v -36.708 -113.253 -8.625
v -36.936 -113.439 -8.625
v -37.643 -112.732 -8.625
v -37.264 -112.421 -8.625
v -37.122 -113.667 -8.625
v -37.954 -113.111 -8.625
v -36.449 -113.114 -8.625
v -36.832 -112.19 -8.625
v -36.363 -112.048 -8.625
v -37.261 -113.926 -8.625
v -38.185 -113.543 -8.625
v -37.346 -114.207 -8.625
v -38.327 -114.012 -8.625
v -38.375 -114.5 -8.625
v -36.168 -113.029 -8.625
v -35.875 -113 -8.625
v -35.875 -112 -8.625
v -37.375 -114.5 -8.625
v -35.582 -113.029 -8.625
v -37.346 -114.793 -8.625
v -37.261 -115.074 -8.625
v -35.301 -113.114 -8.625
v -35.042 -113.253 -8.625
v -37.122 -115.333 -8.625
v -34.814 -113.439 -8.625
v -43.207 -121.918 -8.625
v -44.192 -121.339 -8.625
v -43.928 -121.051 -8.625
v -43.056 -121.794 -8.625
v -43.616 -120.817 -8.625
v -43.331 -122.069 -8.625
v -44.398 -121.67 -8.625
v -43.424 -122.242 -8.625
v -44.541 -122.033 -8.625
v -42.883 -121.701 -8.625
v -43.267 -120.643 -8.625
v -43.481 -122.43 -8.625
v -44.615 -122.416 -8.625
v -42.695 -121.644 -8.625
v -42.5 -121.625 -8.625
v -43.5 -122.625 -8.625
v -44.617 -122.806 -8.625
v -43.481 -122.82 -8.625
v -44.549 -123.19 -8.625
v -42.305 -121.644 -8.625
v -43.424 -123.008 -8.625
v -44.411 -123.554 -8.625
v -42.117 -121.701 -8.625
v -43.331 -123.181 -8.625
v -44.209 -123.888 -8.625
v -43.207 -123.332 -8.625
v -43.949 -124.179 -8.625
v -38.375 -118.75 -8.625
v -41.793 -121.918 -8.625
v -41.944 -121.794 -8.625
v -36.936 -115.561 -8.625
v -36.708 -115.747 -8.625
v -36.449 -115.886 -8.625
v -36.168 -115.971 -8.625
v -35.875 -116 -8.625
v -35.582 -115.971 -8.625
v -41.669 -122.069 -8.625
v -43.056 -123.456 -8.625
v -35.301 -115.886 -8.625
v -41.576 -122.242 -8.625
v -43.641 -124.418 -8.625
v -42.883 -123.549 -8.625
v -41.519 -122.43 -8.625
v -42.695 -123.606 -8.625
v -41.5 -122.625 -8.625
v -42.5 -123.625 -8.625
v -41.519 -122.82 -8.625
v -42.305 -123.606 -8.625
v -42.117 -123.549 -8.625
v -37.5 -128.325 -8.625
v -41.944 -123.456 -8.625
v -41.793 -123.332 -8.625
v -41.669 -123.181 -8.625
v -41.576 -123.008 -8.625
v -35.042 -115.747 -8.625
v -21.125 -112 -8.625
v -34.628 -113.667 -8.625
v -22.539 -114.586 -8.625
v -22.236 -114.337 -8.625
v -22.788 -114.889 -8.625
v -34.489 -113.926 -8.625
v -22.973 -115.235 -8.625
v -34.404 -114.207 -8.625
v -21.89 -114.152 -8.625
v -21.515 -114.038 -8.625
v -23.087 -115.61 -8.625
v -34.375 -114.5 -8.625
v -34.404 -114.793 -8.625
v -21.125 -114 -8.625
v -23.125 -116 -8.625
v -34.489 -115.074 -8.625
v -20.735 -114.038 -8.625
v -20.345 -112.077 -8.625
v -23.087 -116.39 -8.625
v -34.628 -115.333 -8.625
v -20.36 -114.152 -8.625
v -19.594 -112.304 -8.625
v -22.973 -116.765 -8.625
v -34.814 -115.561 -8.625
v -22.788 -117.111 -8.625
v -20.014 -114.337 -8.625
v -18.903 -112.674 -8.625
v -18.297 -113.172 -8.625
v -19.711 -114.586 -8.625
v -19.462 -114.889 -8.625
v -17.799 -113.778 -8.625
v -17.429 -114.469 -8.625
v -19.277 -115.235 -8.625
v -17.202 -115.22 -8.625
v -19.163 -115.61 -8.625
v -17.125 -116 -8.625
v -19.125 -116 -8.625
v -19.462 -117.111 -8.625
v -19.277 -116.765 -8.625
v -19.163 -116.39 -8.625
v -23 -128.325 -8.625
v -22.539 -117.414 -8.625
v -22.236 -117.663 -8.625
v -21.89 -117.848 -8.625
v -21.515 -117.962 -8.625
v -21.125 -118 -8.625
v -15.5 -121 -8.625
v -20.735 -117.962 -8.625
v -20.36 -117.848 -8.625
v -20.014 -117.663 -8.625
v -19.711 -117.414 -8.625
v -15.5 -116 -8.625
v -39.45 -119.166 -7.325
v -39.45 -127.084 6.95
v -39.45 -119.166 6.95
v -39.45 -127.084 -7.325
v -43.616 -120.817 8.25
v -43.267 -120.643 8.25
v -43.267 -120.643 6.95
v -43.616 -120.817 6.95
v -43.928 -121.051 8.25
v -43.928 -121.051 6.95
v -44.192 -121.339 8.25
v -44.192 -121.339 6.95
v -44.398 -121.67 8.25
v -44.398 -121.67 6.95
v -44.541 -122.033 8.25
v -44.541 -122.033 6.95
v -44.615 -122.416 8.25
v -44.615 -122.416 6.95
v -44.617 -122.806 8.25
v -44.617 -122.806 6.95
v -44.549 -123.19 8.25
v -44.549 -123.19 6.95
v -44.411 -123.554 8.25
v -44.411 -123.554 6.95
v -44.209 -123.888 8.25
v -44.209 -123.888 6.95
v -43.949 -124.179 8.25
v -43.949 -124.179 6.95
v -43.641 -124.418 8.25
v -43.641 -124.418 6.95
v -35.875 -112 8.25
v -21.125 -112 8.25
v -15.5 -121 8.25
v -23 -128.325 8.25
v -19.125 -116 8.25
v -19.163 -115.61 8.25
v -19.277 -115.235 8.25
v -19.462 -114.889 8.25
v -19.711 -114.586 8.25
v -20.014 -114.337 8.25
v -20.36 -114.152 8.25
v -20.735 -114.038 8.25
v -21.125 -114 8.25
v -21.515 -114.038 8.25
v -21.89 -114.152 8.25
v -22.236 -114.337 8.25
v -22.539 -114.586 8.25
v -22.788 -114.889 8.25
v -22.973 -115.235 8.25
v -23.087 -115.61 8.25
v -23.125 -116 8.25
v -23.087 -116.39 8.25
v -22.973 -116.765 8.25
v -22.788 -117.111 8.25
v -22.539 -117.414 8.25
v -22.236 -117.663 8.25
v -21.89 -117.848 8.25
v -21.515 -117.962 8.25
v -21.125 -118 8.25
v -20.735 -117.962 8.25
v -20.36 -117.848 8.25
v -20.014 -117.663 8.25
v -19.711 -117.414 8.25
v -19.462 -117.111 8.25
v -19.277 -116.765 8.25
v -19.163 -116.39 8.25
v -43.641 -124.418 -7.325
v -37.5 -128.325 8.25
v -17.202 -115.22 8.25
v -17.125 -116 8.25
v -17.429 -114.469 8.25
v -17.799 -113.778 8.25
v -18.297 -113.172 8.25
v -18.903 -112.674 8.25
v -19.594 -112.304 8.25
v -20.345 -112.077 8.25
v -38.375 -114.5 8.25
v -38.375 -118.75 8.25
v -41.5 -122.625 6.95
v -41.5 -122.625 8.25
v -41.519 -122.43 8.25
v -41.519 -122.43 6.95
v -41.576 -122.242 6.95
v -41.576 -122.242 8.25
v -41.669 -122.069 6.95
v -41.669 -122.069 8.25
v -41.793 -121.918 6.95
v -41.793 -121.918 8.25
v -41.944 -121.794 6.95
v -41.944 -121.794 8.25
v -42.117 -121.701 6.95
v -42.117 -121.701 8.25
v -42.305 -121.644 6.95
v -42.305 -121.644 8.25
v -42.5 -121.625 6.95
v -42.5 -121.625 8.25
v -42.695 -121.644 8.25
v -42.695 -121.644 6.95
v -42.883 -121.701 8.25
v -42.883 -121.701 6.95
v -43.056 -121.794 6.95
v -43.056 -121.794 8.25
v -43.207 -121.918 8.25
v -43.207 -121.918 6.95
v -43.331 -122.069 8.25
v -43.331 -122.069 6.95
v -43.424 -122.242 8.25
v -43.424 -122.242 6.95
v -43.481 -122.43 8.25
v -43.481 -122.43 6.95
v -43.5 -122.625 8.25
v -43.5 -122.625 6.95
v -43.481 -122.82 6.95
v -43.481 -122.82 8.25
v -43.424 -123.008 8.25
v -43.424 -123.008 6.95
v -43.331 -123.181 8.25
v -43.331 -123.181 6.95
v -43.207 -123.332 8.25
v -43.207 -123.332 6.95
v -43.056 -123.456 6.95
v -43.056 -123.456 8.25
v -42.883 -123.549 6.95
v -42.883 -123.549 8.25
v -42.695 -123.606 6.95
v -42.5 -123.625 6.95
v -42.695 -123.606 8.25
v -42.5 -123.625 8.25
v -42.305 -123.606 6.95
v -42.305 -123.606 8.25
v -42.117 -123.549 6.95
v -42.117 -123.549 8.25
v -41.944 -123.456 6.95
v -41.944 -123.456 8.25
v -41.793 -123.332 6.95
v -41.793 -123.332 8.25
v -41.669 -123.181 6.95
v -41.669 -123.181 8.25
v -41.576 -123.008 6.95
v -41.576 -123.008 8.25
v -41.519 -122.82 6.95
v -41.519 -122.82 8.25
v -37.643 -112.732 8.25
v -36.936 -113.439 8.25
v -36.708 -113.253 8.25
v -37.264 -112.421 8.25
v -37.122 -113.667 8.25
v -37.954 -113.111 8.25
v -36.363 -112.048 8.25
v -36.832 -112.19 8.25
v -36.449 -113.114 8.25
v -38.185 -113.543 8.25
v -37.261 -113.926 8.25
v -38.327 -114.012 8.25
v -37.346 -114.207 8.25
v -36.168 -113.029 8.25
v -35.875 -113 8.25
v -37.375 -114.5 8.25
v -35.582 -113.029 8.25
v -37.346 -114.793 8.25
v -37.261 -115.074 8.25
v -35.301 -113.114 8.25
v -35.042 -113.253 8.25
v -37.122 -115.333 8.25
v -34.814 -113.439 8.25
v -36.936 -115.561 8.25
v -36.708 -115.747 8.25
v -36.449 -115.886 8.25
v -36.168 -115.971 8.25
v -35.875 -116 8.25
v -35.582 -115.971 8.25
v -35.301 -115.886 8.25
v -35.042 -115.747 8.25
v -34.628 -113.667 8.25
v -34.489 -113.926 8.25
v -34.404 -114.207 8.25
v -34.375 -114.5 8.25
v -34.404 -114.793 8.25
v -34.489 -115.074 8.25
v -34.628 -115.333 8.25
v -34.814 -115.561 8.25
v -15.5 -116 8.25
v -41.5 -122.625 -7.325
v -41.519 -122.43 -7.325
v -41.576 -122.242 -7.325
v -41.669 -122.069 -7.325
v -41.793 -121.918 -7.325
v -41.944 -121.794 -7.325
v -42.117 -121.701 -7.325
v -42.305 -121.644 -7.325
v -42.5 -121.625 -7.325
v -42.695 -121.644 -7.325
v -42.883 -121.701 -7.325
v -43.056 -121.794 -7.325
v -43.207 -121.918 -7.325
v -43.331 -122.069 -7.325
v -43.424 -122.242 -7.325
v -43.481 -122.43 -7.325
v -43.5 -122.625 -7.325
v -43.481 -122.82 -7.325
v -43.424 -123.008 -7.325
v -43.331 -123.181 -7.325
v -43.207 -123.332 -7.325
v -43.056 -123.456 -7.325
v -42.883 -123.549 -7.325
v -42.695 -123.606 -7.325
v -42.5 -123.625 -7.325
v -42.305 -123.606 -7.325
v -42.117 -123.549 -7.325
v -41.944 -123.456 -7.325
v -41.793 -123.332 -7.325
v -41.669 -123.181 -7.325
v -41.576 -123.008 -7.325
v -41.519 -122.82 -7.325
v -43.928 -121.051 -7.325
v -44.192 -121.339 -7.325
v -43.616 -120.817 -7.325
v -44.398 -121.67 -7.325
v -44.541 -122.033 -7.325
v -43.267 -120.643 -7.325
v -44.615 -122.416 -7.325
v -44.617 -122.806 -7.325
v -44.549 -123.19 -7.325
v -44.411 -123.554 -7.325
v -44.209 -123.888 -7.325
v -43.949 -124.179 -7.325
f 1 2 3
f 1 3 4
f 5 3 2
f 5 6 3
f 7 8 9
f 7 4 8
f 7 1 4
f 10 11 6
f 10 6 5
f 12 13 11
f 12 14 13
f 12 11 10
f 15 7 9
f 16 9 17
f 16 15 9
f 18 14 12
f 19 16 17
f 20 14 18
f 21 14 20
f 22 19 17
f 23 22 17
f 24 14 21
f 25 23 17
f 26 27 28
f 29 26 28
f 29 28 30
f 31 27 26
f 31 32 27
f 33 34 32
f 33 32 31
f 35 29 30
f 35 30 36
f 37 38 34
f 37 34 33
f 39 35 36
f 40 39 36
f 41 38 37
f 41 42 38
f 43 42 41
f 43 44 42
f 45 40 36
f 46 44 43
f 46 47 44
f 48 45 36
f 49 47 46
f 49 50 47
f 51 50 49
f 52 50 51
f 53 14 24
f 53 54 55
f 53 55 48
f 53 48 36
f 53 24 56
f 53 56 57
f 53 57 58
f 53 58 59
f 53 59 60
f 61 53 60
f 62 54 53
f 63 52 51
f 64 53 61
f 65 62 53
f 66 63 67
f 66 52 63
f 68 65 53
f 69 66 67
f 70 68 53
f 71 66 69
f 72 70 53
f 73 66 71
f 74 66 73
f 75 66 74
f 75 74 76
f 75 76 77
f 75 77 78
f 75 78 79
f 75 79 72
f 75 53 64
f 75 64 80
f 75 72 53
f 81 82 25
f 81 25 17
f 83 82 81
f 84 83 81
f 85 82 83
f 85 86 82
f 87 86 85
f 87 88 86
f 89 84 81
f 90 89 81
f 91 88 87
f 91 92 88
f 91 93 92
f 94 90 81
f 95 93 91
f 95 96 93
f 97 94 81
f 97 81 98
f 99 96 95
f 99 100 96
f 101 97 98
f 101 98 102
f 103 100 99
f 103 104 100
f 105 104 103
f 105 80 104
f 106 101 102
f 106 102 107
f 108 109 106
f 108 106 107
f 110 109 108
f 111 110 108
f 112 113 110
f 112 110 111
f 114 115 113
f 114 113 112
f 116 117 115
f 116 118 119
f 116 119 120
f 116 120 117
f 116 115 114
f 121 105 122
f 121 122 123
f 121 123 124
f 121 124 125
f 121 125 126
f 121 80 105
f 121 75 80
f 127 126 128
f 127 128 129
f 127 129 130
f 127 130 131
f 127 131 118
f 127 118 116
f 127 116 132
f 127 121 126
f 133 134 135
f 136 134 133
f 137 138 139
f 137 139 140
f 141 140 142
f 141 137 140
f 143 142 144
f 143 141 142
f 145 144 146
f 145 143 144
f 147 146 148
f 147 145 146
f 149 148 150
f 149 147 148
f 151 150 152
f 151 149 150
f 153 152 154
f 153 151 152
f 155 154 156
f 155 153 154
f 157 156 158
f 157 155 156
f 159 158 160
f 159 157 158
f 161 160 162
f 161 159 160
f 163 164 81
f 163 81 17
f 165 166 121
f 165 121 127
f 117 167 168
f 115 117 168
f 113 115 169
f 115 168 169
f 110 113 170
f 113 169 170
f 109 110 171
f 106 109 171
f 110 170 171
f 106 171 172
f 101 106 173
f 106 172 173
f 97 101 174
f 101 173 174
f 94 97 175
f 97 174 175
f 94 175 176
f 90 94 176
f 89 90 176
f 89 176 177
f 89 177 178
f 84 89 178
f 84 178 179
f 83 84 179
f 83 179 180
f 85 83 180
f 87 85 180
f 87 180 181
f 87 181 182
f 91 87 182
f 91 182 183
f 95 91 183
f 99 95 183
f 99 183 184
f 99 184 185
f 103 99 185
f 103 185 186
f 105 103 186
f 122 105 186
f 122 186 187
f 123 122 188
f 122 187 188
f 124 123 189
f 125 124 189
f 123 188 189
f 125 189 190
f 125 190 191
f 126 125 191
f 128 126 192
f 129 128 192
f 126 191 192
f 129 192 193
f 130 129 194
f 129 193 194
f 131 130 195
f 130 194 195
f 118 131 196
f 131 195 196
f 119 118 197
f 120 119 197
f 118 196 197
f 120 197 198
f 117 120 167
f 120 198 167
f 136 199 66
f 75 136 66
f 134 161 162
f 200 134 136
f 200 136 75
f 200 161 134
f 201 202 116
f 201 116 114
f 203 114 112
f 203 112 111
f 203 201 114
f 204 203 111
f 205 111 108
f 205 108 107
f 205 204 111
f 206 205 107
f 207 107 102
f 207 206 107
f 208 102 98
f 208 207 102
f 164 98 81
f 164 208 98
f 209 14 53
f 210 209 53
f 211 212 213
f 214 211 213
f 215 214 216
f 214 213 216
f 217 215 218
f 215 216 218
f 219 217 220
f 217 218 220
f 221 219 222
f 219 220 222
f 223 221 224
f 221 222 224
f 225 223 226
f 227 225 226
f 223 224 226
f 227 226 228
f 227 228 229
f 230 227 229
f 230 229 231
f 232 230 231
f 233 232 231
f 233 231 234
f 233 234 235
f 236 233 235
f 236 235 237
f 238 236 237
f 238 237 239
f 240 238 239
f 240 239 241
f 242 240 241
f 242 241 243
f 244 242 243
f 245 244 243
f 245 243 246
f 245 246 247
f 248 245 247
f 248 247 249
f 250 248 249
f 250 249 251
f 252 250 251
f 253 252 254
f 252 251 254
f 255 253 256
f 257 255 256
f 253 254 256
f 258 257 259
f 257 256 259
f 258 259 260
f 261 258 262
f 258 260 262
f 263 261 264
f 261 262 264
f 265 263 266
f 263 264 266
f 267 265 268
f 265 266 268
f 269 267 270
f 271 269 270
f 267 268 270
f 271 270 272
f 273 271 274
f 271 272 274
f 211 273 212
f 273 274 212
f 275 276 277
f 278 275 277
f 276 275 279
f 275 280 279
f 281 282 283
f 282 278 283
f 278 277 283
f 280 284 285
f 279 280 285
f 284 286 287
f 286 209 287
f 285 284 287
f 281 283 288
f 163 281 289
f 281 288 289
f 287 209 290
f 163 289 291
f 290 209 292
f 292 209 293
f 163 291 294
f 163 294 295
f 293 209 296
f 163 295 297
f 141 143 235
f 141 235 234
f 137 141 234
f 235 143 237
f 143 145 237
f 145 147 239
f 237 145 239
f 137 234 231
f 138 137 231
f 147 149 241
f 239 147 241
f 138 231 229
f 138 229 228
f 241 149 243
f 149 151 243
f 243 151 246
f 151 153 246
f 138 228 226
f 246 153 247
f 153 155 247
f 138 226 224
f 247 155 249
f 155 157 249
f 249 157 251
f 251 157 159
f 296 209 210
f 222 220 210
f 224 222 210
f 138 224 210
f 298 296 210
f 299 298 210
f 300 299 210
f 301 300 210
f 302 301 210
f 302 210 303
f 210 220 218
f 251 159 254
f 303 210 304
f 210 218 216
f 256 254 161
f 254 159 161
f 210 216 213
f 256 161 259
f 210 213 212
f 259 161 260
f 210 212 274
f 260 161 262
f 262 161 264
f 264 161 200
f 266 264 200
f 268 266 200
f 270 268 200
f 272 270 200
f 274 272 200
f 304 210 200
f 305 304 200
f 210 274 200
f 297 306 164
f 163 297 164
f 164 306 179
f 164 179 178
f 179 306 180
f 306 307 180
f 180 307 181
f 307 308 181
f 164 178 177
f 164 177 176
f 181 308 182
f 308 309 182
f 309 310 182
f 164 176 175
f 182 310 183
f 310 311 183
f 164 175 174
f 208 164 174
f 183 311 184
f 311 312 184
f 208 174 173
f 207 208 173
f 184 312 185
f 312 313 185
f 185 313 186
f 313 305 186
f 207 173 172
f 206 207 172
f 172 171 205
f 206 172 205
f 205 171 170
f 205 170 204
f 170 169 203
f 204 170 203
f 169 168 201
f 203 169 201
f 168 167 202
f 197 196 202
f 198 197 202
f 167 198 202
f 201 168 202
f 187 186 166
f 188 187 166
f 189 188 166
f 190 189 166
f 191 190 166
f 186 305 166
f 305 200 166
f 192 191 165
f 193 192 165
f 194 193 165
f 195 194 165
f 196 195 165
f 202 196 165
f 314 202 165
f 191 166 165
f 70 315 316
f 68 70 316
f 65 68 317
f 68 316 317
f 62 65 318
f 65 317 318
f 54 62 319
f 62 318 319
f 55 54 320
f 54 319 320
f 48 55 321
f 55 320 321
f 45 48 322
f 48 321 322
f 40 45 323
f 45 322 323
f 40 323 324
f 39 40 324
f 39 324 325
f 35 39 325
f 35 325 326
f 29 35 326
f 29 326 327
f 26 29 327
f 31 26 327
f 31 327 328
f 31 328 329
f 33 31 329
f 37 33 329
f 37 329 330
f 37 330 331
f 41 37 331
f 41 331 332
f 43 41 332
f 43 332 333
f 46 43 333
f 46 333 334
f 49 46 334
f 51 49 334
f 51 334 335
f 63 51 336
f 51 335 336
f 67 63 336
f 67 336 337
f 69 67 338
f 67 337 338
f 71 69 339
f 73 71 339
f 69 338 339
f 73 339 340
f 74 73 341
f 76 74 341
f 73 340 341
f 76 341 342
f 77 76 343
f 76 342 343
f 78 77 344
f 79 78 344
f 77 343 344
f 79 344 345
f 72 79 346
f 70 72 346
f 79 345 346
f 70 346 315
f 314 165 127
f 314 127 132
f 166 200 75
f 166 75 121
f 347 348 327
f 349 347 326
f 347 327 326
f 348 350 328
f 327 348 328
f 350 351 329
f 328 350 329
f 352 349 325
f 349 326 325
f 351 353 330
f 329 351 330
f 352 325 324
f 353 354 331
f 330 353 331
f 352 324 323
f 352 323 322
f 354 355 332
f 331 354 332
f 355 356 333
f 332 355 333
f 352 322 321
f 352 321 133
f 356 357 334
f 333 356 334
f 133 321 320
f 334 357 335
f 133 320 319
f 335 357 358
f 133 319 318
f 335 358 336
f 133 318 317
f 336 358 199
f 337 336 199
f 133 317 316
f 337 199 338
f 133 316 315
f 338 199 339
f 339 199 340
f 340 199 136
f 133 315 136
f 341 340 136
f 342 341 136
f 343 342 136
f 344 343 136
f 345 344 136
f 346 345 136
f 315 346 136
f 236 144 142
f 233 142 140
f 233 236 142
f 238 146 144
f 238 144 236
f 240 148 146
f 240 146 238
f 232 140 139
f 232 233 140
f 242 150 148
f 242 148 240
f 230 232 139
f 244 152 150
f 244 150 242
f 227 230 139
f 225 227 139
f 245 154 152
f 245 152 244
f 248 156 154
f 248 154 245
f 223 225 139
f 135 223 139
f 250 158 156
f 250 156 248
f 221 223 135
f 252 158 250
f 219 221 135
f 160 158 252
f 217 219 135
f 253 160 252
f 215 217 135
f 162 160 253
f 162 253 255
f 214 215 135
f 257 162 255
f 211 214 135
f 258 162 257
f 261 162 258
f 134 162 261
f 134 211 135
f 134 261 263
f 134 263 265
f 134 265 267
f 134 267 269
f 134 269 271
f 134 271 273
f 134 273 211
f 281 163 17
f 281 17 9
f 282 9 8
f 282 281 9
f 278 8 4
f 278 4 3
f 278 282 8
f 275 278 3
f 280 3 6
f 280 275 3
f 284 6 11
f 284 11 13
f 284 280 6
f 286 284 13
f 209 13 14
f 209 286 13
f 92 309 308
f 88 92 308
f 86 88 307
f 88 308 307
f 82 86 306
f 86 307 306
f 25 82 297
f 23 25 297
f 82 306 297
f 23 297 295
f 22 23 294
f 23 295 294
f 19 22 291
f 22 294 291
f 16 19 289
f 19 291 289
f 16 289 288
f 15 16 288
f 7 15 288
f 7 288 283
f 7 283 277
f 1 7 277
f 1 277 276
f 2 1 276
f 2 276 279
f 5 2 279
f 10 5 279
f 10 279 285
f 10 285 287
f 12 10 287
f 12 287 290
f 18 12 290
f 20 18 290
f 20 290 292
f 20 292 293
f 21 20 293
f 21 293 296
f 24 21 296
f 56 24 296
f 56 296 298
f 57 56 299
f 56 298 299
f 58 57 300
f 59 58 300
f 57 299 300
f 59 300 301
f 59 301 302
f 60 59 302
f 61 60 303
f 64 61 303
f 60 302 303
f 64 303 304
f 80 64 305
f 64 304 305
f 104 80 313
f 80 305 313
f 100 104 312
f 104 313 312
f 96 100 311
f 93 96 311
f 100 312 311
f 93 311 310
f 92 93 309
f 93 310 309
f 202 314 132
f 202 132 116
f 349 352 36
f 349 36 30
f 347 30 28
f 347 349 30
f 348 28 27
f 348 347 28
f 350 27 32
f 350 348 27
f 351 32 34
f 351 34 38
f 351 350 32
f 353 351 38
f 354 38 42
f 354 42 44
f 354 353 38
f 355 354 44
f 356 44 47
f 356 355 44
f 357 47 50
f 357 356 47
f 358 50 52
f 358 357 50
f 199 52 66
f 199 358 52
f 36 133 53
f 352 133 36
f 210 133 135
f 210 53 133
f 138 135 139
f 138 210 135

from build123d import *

# Parameters (mm, degrees)
SKETCH_2_R               = 4
SKETCH_2_R_2             = 2
SKETCH_2_R_3             = 2.5
SKETCH_2_R_4             = 1.5
SKETCH_2_R_5             = 2.125
SKETCH_2_R_6             = 1
EXTRUDE_1_DEPTH          = 17.125
CUT_EXTRUDE_1_DEPTH      = 137.144257132
CUT_EXTRUDE_1_DEPTH_BACK = 137.144257132
SKETCH_3_W               = 6.985996156
SKETCH_3_H               = 14.275
CUT_EXTRUDE_START        = -128.325
CUT_EXTRUDE_2_OUTLINE_W  = 32
CUT_EXTRUDE_2_OUTLINE_H  = 0.125
CUT_EXTRUDE_2_DEPTH      = 16.325


# Read off the part's stored shape, not the designer's step: 切除-拉伸2
with BuildPart() as part:
    # 草图2 → 凸台-拉伸1 (new body)
    # profile 1 of 4: a face of its own
    with BuildSketch(Plane.XY.offset(8.375)):
        with BuildLine():
            Line((-15.5, -121), (-15.5, -116))
            Line((-15.5, -116), (-17.125, -116))
            ThreePointArc((-17.125, -116), (-23.953427125, -118.828427125), (-21.125, -112))
            Line((-21.125, -112), (-35.875, -112))
            ThreePointArc((-35.875, -112), (-34.107233047, -112.732233047), (-33.375, -114.5))
            ThreePointArc((-33.375, -114.5), (-35.875, -117), (-38.375, -114.5))
            Line((-38.375, -114.5), (-38.375, -118.75))
            Line((-38.375, -118.75), (-43.26696162, -120.643234405))
            ThreePointArc((-43.26696162, -120.643234405), (-41.298785706, -120.872085507), (-40.375, -122.625))
            ThreePointArc((-40.375, -122.625), (-41.477365663, -124.487751731), (-43.640735541, -124.417860124))
            Line((-43.640735541, -124.417860124), (-37.5, -128.325))
            Line((-37.5, -128.325), (-23, -128.325))
            Line((-23, -128.325), (-15.5, -121))
        make_face()
    # profile 2 of 4: a face of its own
    with BuildSketch(Plane.XY.offset(8.375)):
        with Locations((-21.125, -116)):
            Circle(SKETCH_2_R)
        with Locations((-21.125, -116)):
            Circle(SKETCH_2_R_2, mode=Mode.SUBTRACT)
    # profile 3 of 4: a face of its own
    with BuildSketch(Plane.XY.offset(8.375)):
        with Locations((-35.875, -114.5)):
            Circle(SKETCH_2_R_3)
        with Locations((-35.875, -114.5)):
            Circle(SKETCH_2_R_4, mode=Mode.SUBTRACT)
    # profile 4 of 4: a face of its own
    with BuildSketch(Plane.XY.offset(8.375)):
        with Locations((-42.5, -122.625)):
            Circle(SKETCH_2_R_5)
        with Locations((-42.5, -122.625)):
            Circle(SKETCH_2_R_6, mode=Mode.SUBTRACT)
    extrude(amount=-EXTRUDE_1_DEPTH)

    # 草图3 → 切除-拉伸1 (cut, two sides: drawn at the far end of the back side and taken through both)
    with BuildSketch(Plane(origin=(0, 0, 0), x_dir=(1, 0, 0), z_dir=(0, 1, 0)).offset(-CUT_EXTRUDE_1_DEPTH_BACK)):
        with Locations((-42.942998078, 0.1875)):
            Rectangle(SKETCH_3_W, SKETCH_3_H)
    extrude(amount=CUT_EXTRUDE_1_DEPTH + CUT_EXTRUDE_1_DEPTH_BACK, mode=Mode.SUBTRACT)

    # 切除-拉伸2 outline → 切除-拉伸2 (cut)
    with BuildSketch(Plane(origin=(0, 0, 0), x_dir=(1, 0, 0), z_dir=(0, 1, 0)).offset(CUT_EXTRUDE_START)):
        with Locations((-30, -8.3125)):
            Rectangle(CUT_EXTRUDE_2_OUTLINE_W, CUT_EXTRUDE_2_OUTLINE_H)
        with Locations((-30, 8.6875)):
            Rectangle(CUT_EXTRUDE_2_OUTLINE_W, CUT_EXTRUDE_2_OUTLINE_H)
    extrude(amount=CUT_EXTRUDE_2_DEPTH, mode=Mode.SUBTRACT)


solid = part.part
